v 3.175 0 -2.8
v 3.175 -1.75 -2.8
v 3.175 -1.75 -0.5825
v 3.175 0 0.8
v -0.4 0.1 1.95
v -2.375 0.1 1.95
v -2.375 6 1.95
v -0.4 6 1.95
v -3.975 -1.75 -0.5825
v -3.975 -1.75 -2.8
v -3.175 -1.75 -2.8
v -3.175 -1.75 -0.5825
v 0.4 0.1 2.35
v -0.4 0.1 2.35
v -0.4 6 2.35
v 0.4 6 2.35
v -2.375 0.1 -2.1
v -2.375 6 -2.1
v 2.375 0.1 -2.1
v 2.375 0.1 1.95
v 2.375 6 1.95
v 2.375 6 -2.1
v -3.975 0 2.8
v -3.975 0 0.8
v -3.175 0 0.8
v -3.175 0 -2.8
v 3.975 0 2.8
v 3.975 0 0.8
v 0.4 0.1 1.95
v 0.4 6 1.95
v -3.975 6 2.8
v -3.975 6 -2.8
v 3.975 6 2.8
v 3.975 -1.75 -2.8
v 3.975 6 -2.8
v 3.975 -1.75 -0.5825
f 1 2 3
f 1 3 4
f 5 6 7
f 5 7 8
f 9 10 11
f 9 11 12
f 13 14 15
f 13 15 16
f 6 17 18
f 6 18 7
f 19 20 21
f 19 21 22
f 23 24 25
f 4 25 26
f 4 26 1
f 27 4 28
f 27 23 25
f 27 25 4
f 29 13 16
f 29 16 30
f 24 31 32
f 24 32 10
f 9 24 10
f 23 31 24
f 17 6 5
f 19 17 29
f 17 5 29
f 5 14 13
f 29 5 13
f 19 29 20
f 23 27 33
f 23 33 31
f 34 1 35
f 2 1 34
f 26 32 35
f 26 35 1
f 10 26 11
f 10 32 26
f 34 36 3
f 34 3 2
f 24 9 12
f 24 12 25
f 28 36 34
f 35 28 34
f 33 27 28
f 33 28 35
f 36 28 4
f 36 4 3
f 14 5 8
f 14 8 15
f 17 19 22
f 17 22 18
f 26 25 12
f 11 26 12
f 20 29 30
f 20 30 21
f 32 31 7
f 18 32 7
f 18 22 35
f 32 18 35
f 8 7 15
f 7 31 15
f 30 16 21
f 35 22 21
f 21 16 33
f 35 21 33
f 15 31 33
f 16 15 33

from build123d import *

# Parameters (mm, degrees)
F0_W     = 1.6
F0_H     = 0.85
F0_H_2   = 0.7
F1_DEPTH = 6
F0_W_2   = 0.4
F0_H_3   = 0.4
F2_DEPTH = 0.1
F4_DEPTH = 0.8
F6_DEPTH = 0.8


with BuildPart() as f1:
    # F0 (on Front) → F1 (new body)
    with BuildSketch(Plane.XZ):
        Polygon((-2.375, 1.95), (-3.975, 1.95), (-3.975, -2.8), (2.375, -2.8), (2.375, -2.1), (-2.375, -2.1), align=None)
        with Locations((-3.175, 2.375)):
            Rectangle(F0_W, F0_H)
        Polygon((3.975, 2.8), (-2.375, 2.8), (-2.375, 1.95), (-0.4, 1.95), (-0.4, 2.35), (0, 2.35), (0.4, 2.35), (0.4, 1.95), (2.375, 1.95), (2.375, -2.1), (3.975, -2.1), align=None)
        with Locations((3.175, -2.45)):
            Rectangle(F0_W, F0_H_2)
    extrude(amount=-F1_DEPTH)

    # F0 (on Front) → F2 (join)
    with BuildSketch(Plane.XZ):
        Polygon((-0.4, 1.95), (-2.375, 1.95), (-2.375, -2.1), (2.375, -2.1), (2.375, 1.95), (0.4, 1.95), (0, 1.95), align=None)
        with Locations((-0.2, 2.15)):
            Rectangle(F0_W_2, F0_H_3)
        with Locations((0.2, 2.15)):
            Rectangle(F0_W_2, F0_H_3)
    extrude(amount=-F2_DEPTH)

    # F3 (on face) → F4 (join)
    with BuildSketch(Plane.YZ.offset(3.975)):
        Polygon((0, -2.8), (0, 0.8), (-1.75, -0.582549), (-1.75, -2.8), align=None)
    extrude(amount=-F4_DEPTH)

    # F5 (on face) → F6 (join)
    with BuildSketch(Plane(origin=(-3.975, 0, 0), x_dir=(0, -1, 0), z_dir=(-1, 0, 0))):
        Polygon((1.75, -0.582549), (0, 0.8), (0, -2.8), (1.75, -2.8), align=None)
    extrude(amount=-F6_DEPTH)


solid = f1.part
